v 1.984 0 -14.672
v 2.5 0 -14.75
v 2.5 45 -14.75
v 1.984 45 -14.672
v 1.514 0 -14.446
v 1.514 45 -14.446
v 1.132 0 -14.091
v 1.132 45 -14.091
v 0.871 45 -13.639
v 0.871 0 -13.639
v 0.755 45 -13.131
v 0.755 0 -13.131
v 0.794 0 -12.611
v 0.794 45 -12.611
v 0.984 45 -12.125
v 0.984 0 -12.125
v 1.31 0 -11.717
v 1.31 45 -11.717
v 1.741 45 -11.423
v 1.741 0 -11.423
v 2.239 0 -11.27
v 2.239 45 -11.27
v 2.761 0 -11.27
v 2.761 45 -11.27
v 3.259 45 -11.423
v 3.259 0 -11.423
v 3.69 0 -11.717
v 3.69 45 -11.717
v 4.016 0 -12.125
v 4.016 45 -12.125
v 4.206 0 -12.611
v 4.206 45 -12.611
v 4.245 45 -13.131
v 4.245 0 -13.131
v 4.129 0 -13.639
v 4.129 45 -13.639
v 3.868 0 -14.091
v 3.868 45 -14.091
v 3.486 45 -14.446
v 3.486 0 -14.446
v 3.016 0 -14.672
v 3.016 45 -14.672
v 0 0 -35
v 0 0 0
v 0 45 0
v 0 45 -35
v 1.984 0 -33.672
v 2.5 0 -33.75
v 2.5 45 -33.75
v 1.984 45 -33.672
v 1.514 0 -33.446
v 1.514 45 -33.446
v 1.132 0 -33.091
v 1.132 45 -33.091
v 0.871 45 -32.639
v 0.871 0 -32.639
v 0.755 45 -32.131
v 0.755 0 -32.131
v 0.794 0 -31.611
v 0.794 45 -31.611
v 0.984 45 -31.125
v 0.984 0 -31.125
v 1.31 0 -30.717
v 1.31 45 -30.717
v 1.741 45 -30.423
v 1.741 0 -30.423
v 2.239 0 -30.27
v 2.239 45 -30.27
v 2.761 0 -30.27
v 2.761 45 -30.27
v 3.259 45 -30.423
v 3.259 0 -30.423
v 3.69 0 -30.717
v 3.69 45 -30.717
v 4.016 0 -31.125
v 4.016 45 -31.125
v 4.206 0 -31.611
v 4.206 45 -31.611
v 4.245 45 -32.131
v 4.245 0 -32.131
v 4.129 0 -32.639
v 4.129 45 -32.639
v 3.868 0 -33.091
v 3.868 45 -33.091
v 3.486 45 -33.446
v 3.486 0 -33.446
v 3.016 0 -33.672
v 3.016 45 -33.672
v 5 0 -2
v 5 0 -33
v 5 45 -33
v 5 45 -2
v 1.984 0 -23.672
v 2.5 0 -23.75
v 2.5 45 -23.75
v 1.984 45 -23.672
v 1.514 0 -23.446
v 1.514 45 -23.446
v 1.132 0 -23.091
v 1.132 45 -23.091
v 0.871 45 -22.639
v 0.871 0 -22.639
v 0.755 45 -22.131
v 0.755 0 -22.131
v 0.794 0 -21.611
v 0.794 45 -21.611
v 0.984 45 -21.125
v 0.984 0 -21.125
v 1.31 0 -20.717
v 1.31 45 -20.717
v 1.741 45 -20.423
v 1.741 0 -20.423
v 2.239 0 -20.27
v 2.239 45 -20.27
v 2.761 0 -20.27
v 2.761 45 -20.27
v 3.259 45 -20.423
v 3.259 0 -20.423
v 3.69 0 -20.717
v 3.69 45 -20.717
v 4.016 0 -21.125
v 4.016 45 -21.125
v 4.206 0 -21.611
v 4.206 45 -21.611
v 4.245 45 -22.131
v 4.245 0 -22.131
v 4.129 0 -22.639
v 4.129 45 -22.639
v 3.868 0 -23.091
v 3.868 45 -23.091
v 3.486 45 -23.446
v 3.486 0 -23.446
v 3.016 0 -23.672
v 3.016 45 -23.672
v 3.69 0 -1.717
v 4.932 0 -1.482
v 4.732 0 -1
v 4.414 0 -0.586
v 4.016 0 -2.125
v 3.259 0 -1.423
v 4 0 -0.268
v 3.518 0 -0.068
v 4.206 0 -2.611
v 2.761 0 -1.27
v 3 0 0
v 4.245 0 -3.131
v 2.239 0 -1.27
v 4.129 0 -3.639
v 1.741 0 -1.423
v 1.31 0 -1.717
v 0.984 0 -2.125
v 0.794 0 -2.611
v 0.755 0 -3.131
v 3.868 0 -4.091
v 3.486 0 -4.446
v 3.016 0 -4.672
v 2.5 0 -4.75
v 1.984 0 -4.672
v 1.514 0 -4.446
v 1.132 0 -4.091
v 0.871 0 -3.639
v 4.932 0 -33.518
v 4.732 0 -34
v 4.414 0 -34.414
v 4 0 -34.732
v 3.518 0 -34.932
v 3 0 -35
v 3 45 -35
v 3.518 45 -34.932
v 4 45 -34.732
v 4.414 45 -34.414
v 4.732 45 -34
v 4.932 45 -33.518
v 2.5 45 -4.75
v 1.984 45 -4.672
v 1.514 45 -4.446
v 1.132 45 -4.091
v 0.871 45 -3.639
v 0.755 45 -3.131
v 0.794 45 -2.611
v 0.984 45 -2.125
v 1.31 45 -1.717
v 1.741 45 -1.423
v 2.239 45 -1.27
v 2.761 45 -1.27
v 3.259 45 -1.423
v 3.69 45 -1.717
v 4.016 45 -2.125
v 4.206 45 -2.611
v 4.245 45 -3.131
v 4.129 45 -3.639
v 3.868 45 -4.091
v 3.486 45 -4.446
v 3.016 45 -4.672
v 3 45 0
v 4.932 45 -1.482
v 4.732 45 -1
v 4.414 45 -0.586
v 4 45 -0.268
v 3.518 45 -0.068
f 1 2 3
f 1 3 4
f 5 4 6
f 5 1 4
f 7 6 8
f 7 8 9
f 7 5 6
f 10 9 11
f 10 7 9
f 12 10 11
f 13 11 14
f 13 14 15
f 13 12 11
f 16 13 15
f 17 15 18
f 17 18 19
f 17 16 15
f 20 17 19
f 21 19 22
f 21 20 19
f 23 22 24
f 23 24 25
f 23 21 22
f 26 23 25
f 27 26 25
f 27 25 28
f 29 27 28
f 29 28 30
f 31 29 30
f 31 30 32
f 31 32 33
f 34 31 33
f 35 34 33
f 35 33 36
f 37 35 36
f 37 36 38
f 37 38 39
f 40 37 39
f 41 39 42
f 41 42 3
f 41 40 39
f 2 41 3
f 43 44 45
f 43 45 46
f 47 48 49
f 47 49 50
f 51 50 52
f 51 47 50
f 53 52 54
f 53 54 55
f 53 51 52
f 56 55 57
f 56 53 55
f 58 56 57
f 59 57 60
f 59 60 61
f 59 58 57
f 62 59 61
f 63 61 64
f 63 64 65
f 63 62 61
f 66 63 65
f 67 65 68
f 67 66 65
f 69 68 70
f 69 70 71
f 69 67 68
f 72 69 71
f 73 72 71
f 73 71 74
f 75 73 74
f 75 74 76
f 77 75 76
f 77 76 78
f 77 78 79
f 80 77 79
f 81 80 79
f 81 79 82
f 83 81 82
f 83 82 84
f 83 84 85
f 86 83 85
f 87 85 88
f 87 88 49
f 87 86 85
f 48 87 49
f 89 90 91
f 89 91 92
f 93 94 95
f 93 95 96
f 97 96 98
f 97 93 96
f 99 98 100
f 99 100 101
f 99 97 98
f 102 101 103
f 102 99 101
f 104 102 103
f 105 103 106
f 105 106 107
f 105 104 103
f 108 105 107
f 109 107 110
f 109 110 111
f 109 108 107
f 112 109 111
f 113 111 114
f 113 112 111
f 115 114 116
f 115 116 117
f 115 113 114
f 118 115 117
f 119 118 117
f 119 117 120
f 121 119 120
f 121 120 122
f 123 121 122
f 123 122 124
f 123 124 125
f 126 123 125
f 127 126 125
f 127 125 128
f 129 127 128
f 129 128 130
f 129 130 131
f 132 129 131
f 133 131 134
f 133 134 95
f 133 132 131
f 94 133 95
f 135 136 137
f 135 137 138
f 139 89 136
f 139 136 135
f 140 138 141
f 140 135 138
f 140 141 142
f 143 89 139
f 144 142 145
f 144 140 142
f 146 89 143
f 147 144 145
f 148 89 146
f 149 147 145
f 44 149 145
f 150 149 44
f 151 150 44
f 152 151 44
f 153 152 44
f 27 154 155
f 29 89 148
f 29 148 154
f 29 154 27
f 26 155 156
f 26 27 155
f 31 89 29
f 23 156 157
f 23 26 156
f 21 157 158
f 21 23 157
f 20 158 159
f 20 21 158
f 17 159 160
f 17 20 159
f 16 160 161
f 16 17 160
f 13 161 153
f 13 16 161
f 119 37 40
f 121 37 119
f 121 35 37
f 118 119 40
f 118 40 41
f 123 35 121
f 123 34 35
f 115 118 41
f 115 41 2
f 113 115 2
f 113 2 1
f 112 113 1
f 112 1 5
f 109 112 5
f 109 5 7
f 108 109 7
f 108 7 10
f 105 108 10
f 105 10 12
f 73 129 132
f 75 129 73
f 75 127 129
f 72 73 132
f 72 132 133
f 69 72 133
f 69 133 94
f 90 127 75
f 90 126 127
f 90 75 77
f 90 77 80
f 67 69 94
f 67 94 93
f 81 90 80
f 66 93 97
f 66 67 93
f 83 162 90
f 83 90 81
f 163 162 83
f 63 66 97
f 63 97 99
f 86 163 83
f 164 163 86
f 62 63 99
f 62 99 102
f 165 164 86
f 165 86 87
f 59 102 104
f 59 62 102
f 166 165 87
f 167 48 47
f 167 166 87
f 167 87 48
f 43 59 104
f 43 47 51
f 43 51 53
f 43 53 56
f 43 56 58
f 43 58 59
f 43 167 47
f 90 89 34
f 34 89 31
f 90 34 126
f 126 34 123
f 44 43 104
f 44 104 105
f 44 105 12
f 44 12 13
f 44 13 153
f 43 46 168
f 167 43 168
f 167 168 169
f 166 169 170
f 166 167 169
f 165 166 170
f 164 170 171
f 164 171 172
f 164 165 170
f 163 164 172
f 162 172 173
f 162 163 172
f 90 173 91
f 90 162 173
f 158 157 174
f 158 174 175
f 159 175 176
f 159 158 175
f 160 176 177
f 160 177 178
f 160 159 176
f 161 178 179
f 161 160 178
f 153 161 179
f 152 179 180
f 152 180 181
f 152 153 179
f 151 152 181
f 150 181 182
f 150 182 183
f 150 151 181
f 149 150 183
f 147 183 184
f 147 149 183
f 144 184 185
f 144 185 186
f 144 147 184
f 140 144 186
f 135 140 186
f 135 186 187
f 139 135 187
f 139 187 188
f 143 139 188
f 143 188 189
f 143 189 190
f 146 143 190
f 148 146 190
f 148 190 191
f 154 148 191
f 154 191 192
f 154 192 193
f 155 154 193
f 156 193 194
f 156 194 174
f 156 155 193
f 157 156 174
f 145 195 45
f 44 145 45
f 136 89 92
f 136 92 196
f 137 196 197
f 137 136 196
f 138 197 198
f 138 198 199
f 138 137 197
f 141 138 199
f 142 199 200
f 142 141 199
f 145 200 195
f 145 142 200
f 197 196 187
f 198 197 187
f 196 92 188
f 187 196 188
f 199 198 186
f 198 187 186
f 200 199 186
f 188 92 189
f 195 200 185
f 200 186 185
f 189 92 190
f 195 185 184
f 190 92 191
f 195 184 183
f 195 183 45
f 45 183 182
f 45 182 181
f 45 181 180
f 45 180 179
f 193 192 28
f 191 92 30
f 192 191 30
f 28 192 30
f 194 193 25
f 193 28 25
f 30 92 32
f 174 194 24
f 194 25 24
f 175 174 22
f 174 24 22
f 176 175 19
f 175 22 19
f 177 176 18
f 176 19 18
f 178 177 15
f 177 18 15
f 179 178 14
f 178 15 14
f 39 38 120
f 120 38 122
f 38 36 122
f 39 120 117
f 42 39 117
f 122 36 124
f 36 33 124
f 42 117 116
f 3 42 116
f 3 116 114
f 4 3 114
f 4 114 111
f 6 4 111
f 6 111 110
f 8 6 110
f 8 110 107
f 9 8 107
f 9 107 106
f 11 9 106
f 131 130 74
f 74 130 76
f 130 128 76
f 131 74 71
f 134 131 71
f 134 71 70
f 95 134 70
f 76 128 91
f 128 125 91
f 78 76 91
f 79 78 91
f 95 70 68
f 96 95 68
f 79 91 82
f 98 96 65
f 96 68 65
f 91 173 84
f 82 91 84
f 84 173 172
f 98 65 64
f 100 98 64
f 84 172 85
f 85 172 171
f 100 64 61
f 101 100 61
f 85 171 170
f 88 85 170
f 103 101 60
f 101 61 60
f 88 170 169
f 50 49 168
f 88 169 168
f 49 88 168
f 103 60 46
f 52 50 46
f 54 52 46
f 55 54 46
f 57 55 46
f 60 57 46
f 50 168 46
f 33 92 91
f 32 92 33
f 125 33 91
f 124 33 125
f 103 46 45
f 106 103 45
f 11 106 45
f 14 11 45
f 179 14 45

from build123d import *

# Parameters (mm, degrees)
SKETCH1_R           = 1.75
BOSS_EXTRUDE1_DEPTH = 45


with BuildPart() as part:
    # Sketch1 → Boss-Extrude1 (new body)
    with BuildSketch(Plane(origin=(0, 0, 0), x_dir=(1, 0, 0), z_dir=(0, 1, 0))):
        with BuildLine():
            Line((0, 35), (3, 35))
            ThreePointArc((3, 35), (4.414213562, 34.414213562), (5, 33))
            Line((5, 33), (5, 2))
            ThreePointArc((5, 2), (4.414213562, 0.585786438), (3, 0))
            Line((3, 0), (0, 0))
            Line((0, 0), (0, 35))
        make_face()
        with Locations(Location((2.5, 32, 0), (0, 0, 90))):
            Circle(SKETCH1_R, mode=Mode.SUBTRACT)
        with Locations(Location((2.5, 22, 0), (0, 0, 90))):
            Circle(SKETCH1_R, mode=Mode.SUBTRACT)
        with Locations(Location((2.5, 13, 0), (0, 0, 90))):
            Circle(SKETCH1_R, mode=Mode.SUBTRACT)
        with Locations(Location((2.5, 3, 0), (0, 0, 90))):
            Circle(SKETCH1_R, mode=Mode.SUBTRACT)
    extrude(amount=BOSS_EXTRUDE1_DEPTH)


solid = part.part
